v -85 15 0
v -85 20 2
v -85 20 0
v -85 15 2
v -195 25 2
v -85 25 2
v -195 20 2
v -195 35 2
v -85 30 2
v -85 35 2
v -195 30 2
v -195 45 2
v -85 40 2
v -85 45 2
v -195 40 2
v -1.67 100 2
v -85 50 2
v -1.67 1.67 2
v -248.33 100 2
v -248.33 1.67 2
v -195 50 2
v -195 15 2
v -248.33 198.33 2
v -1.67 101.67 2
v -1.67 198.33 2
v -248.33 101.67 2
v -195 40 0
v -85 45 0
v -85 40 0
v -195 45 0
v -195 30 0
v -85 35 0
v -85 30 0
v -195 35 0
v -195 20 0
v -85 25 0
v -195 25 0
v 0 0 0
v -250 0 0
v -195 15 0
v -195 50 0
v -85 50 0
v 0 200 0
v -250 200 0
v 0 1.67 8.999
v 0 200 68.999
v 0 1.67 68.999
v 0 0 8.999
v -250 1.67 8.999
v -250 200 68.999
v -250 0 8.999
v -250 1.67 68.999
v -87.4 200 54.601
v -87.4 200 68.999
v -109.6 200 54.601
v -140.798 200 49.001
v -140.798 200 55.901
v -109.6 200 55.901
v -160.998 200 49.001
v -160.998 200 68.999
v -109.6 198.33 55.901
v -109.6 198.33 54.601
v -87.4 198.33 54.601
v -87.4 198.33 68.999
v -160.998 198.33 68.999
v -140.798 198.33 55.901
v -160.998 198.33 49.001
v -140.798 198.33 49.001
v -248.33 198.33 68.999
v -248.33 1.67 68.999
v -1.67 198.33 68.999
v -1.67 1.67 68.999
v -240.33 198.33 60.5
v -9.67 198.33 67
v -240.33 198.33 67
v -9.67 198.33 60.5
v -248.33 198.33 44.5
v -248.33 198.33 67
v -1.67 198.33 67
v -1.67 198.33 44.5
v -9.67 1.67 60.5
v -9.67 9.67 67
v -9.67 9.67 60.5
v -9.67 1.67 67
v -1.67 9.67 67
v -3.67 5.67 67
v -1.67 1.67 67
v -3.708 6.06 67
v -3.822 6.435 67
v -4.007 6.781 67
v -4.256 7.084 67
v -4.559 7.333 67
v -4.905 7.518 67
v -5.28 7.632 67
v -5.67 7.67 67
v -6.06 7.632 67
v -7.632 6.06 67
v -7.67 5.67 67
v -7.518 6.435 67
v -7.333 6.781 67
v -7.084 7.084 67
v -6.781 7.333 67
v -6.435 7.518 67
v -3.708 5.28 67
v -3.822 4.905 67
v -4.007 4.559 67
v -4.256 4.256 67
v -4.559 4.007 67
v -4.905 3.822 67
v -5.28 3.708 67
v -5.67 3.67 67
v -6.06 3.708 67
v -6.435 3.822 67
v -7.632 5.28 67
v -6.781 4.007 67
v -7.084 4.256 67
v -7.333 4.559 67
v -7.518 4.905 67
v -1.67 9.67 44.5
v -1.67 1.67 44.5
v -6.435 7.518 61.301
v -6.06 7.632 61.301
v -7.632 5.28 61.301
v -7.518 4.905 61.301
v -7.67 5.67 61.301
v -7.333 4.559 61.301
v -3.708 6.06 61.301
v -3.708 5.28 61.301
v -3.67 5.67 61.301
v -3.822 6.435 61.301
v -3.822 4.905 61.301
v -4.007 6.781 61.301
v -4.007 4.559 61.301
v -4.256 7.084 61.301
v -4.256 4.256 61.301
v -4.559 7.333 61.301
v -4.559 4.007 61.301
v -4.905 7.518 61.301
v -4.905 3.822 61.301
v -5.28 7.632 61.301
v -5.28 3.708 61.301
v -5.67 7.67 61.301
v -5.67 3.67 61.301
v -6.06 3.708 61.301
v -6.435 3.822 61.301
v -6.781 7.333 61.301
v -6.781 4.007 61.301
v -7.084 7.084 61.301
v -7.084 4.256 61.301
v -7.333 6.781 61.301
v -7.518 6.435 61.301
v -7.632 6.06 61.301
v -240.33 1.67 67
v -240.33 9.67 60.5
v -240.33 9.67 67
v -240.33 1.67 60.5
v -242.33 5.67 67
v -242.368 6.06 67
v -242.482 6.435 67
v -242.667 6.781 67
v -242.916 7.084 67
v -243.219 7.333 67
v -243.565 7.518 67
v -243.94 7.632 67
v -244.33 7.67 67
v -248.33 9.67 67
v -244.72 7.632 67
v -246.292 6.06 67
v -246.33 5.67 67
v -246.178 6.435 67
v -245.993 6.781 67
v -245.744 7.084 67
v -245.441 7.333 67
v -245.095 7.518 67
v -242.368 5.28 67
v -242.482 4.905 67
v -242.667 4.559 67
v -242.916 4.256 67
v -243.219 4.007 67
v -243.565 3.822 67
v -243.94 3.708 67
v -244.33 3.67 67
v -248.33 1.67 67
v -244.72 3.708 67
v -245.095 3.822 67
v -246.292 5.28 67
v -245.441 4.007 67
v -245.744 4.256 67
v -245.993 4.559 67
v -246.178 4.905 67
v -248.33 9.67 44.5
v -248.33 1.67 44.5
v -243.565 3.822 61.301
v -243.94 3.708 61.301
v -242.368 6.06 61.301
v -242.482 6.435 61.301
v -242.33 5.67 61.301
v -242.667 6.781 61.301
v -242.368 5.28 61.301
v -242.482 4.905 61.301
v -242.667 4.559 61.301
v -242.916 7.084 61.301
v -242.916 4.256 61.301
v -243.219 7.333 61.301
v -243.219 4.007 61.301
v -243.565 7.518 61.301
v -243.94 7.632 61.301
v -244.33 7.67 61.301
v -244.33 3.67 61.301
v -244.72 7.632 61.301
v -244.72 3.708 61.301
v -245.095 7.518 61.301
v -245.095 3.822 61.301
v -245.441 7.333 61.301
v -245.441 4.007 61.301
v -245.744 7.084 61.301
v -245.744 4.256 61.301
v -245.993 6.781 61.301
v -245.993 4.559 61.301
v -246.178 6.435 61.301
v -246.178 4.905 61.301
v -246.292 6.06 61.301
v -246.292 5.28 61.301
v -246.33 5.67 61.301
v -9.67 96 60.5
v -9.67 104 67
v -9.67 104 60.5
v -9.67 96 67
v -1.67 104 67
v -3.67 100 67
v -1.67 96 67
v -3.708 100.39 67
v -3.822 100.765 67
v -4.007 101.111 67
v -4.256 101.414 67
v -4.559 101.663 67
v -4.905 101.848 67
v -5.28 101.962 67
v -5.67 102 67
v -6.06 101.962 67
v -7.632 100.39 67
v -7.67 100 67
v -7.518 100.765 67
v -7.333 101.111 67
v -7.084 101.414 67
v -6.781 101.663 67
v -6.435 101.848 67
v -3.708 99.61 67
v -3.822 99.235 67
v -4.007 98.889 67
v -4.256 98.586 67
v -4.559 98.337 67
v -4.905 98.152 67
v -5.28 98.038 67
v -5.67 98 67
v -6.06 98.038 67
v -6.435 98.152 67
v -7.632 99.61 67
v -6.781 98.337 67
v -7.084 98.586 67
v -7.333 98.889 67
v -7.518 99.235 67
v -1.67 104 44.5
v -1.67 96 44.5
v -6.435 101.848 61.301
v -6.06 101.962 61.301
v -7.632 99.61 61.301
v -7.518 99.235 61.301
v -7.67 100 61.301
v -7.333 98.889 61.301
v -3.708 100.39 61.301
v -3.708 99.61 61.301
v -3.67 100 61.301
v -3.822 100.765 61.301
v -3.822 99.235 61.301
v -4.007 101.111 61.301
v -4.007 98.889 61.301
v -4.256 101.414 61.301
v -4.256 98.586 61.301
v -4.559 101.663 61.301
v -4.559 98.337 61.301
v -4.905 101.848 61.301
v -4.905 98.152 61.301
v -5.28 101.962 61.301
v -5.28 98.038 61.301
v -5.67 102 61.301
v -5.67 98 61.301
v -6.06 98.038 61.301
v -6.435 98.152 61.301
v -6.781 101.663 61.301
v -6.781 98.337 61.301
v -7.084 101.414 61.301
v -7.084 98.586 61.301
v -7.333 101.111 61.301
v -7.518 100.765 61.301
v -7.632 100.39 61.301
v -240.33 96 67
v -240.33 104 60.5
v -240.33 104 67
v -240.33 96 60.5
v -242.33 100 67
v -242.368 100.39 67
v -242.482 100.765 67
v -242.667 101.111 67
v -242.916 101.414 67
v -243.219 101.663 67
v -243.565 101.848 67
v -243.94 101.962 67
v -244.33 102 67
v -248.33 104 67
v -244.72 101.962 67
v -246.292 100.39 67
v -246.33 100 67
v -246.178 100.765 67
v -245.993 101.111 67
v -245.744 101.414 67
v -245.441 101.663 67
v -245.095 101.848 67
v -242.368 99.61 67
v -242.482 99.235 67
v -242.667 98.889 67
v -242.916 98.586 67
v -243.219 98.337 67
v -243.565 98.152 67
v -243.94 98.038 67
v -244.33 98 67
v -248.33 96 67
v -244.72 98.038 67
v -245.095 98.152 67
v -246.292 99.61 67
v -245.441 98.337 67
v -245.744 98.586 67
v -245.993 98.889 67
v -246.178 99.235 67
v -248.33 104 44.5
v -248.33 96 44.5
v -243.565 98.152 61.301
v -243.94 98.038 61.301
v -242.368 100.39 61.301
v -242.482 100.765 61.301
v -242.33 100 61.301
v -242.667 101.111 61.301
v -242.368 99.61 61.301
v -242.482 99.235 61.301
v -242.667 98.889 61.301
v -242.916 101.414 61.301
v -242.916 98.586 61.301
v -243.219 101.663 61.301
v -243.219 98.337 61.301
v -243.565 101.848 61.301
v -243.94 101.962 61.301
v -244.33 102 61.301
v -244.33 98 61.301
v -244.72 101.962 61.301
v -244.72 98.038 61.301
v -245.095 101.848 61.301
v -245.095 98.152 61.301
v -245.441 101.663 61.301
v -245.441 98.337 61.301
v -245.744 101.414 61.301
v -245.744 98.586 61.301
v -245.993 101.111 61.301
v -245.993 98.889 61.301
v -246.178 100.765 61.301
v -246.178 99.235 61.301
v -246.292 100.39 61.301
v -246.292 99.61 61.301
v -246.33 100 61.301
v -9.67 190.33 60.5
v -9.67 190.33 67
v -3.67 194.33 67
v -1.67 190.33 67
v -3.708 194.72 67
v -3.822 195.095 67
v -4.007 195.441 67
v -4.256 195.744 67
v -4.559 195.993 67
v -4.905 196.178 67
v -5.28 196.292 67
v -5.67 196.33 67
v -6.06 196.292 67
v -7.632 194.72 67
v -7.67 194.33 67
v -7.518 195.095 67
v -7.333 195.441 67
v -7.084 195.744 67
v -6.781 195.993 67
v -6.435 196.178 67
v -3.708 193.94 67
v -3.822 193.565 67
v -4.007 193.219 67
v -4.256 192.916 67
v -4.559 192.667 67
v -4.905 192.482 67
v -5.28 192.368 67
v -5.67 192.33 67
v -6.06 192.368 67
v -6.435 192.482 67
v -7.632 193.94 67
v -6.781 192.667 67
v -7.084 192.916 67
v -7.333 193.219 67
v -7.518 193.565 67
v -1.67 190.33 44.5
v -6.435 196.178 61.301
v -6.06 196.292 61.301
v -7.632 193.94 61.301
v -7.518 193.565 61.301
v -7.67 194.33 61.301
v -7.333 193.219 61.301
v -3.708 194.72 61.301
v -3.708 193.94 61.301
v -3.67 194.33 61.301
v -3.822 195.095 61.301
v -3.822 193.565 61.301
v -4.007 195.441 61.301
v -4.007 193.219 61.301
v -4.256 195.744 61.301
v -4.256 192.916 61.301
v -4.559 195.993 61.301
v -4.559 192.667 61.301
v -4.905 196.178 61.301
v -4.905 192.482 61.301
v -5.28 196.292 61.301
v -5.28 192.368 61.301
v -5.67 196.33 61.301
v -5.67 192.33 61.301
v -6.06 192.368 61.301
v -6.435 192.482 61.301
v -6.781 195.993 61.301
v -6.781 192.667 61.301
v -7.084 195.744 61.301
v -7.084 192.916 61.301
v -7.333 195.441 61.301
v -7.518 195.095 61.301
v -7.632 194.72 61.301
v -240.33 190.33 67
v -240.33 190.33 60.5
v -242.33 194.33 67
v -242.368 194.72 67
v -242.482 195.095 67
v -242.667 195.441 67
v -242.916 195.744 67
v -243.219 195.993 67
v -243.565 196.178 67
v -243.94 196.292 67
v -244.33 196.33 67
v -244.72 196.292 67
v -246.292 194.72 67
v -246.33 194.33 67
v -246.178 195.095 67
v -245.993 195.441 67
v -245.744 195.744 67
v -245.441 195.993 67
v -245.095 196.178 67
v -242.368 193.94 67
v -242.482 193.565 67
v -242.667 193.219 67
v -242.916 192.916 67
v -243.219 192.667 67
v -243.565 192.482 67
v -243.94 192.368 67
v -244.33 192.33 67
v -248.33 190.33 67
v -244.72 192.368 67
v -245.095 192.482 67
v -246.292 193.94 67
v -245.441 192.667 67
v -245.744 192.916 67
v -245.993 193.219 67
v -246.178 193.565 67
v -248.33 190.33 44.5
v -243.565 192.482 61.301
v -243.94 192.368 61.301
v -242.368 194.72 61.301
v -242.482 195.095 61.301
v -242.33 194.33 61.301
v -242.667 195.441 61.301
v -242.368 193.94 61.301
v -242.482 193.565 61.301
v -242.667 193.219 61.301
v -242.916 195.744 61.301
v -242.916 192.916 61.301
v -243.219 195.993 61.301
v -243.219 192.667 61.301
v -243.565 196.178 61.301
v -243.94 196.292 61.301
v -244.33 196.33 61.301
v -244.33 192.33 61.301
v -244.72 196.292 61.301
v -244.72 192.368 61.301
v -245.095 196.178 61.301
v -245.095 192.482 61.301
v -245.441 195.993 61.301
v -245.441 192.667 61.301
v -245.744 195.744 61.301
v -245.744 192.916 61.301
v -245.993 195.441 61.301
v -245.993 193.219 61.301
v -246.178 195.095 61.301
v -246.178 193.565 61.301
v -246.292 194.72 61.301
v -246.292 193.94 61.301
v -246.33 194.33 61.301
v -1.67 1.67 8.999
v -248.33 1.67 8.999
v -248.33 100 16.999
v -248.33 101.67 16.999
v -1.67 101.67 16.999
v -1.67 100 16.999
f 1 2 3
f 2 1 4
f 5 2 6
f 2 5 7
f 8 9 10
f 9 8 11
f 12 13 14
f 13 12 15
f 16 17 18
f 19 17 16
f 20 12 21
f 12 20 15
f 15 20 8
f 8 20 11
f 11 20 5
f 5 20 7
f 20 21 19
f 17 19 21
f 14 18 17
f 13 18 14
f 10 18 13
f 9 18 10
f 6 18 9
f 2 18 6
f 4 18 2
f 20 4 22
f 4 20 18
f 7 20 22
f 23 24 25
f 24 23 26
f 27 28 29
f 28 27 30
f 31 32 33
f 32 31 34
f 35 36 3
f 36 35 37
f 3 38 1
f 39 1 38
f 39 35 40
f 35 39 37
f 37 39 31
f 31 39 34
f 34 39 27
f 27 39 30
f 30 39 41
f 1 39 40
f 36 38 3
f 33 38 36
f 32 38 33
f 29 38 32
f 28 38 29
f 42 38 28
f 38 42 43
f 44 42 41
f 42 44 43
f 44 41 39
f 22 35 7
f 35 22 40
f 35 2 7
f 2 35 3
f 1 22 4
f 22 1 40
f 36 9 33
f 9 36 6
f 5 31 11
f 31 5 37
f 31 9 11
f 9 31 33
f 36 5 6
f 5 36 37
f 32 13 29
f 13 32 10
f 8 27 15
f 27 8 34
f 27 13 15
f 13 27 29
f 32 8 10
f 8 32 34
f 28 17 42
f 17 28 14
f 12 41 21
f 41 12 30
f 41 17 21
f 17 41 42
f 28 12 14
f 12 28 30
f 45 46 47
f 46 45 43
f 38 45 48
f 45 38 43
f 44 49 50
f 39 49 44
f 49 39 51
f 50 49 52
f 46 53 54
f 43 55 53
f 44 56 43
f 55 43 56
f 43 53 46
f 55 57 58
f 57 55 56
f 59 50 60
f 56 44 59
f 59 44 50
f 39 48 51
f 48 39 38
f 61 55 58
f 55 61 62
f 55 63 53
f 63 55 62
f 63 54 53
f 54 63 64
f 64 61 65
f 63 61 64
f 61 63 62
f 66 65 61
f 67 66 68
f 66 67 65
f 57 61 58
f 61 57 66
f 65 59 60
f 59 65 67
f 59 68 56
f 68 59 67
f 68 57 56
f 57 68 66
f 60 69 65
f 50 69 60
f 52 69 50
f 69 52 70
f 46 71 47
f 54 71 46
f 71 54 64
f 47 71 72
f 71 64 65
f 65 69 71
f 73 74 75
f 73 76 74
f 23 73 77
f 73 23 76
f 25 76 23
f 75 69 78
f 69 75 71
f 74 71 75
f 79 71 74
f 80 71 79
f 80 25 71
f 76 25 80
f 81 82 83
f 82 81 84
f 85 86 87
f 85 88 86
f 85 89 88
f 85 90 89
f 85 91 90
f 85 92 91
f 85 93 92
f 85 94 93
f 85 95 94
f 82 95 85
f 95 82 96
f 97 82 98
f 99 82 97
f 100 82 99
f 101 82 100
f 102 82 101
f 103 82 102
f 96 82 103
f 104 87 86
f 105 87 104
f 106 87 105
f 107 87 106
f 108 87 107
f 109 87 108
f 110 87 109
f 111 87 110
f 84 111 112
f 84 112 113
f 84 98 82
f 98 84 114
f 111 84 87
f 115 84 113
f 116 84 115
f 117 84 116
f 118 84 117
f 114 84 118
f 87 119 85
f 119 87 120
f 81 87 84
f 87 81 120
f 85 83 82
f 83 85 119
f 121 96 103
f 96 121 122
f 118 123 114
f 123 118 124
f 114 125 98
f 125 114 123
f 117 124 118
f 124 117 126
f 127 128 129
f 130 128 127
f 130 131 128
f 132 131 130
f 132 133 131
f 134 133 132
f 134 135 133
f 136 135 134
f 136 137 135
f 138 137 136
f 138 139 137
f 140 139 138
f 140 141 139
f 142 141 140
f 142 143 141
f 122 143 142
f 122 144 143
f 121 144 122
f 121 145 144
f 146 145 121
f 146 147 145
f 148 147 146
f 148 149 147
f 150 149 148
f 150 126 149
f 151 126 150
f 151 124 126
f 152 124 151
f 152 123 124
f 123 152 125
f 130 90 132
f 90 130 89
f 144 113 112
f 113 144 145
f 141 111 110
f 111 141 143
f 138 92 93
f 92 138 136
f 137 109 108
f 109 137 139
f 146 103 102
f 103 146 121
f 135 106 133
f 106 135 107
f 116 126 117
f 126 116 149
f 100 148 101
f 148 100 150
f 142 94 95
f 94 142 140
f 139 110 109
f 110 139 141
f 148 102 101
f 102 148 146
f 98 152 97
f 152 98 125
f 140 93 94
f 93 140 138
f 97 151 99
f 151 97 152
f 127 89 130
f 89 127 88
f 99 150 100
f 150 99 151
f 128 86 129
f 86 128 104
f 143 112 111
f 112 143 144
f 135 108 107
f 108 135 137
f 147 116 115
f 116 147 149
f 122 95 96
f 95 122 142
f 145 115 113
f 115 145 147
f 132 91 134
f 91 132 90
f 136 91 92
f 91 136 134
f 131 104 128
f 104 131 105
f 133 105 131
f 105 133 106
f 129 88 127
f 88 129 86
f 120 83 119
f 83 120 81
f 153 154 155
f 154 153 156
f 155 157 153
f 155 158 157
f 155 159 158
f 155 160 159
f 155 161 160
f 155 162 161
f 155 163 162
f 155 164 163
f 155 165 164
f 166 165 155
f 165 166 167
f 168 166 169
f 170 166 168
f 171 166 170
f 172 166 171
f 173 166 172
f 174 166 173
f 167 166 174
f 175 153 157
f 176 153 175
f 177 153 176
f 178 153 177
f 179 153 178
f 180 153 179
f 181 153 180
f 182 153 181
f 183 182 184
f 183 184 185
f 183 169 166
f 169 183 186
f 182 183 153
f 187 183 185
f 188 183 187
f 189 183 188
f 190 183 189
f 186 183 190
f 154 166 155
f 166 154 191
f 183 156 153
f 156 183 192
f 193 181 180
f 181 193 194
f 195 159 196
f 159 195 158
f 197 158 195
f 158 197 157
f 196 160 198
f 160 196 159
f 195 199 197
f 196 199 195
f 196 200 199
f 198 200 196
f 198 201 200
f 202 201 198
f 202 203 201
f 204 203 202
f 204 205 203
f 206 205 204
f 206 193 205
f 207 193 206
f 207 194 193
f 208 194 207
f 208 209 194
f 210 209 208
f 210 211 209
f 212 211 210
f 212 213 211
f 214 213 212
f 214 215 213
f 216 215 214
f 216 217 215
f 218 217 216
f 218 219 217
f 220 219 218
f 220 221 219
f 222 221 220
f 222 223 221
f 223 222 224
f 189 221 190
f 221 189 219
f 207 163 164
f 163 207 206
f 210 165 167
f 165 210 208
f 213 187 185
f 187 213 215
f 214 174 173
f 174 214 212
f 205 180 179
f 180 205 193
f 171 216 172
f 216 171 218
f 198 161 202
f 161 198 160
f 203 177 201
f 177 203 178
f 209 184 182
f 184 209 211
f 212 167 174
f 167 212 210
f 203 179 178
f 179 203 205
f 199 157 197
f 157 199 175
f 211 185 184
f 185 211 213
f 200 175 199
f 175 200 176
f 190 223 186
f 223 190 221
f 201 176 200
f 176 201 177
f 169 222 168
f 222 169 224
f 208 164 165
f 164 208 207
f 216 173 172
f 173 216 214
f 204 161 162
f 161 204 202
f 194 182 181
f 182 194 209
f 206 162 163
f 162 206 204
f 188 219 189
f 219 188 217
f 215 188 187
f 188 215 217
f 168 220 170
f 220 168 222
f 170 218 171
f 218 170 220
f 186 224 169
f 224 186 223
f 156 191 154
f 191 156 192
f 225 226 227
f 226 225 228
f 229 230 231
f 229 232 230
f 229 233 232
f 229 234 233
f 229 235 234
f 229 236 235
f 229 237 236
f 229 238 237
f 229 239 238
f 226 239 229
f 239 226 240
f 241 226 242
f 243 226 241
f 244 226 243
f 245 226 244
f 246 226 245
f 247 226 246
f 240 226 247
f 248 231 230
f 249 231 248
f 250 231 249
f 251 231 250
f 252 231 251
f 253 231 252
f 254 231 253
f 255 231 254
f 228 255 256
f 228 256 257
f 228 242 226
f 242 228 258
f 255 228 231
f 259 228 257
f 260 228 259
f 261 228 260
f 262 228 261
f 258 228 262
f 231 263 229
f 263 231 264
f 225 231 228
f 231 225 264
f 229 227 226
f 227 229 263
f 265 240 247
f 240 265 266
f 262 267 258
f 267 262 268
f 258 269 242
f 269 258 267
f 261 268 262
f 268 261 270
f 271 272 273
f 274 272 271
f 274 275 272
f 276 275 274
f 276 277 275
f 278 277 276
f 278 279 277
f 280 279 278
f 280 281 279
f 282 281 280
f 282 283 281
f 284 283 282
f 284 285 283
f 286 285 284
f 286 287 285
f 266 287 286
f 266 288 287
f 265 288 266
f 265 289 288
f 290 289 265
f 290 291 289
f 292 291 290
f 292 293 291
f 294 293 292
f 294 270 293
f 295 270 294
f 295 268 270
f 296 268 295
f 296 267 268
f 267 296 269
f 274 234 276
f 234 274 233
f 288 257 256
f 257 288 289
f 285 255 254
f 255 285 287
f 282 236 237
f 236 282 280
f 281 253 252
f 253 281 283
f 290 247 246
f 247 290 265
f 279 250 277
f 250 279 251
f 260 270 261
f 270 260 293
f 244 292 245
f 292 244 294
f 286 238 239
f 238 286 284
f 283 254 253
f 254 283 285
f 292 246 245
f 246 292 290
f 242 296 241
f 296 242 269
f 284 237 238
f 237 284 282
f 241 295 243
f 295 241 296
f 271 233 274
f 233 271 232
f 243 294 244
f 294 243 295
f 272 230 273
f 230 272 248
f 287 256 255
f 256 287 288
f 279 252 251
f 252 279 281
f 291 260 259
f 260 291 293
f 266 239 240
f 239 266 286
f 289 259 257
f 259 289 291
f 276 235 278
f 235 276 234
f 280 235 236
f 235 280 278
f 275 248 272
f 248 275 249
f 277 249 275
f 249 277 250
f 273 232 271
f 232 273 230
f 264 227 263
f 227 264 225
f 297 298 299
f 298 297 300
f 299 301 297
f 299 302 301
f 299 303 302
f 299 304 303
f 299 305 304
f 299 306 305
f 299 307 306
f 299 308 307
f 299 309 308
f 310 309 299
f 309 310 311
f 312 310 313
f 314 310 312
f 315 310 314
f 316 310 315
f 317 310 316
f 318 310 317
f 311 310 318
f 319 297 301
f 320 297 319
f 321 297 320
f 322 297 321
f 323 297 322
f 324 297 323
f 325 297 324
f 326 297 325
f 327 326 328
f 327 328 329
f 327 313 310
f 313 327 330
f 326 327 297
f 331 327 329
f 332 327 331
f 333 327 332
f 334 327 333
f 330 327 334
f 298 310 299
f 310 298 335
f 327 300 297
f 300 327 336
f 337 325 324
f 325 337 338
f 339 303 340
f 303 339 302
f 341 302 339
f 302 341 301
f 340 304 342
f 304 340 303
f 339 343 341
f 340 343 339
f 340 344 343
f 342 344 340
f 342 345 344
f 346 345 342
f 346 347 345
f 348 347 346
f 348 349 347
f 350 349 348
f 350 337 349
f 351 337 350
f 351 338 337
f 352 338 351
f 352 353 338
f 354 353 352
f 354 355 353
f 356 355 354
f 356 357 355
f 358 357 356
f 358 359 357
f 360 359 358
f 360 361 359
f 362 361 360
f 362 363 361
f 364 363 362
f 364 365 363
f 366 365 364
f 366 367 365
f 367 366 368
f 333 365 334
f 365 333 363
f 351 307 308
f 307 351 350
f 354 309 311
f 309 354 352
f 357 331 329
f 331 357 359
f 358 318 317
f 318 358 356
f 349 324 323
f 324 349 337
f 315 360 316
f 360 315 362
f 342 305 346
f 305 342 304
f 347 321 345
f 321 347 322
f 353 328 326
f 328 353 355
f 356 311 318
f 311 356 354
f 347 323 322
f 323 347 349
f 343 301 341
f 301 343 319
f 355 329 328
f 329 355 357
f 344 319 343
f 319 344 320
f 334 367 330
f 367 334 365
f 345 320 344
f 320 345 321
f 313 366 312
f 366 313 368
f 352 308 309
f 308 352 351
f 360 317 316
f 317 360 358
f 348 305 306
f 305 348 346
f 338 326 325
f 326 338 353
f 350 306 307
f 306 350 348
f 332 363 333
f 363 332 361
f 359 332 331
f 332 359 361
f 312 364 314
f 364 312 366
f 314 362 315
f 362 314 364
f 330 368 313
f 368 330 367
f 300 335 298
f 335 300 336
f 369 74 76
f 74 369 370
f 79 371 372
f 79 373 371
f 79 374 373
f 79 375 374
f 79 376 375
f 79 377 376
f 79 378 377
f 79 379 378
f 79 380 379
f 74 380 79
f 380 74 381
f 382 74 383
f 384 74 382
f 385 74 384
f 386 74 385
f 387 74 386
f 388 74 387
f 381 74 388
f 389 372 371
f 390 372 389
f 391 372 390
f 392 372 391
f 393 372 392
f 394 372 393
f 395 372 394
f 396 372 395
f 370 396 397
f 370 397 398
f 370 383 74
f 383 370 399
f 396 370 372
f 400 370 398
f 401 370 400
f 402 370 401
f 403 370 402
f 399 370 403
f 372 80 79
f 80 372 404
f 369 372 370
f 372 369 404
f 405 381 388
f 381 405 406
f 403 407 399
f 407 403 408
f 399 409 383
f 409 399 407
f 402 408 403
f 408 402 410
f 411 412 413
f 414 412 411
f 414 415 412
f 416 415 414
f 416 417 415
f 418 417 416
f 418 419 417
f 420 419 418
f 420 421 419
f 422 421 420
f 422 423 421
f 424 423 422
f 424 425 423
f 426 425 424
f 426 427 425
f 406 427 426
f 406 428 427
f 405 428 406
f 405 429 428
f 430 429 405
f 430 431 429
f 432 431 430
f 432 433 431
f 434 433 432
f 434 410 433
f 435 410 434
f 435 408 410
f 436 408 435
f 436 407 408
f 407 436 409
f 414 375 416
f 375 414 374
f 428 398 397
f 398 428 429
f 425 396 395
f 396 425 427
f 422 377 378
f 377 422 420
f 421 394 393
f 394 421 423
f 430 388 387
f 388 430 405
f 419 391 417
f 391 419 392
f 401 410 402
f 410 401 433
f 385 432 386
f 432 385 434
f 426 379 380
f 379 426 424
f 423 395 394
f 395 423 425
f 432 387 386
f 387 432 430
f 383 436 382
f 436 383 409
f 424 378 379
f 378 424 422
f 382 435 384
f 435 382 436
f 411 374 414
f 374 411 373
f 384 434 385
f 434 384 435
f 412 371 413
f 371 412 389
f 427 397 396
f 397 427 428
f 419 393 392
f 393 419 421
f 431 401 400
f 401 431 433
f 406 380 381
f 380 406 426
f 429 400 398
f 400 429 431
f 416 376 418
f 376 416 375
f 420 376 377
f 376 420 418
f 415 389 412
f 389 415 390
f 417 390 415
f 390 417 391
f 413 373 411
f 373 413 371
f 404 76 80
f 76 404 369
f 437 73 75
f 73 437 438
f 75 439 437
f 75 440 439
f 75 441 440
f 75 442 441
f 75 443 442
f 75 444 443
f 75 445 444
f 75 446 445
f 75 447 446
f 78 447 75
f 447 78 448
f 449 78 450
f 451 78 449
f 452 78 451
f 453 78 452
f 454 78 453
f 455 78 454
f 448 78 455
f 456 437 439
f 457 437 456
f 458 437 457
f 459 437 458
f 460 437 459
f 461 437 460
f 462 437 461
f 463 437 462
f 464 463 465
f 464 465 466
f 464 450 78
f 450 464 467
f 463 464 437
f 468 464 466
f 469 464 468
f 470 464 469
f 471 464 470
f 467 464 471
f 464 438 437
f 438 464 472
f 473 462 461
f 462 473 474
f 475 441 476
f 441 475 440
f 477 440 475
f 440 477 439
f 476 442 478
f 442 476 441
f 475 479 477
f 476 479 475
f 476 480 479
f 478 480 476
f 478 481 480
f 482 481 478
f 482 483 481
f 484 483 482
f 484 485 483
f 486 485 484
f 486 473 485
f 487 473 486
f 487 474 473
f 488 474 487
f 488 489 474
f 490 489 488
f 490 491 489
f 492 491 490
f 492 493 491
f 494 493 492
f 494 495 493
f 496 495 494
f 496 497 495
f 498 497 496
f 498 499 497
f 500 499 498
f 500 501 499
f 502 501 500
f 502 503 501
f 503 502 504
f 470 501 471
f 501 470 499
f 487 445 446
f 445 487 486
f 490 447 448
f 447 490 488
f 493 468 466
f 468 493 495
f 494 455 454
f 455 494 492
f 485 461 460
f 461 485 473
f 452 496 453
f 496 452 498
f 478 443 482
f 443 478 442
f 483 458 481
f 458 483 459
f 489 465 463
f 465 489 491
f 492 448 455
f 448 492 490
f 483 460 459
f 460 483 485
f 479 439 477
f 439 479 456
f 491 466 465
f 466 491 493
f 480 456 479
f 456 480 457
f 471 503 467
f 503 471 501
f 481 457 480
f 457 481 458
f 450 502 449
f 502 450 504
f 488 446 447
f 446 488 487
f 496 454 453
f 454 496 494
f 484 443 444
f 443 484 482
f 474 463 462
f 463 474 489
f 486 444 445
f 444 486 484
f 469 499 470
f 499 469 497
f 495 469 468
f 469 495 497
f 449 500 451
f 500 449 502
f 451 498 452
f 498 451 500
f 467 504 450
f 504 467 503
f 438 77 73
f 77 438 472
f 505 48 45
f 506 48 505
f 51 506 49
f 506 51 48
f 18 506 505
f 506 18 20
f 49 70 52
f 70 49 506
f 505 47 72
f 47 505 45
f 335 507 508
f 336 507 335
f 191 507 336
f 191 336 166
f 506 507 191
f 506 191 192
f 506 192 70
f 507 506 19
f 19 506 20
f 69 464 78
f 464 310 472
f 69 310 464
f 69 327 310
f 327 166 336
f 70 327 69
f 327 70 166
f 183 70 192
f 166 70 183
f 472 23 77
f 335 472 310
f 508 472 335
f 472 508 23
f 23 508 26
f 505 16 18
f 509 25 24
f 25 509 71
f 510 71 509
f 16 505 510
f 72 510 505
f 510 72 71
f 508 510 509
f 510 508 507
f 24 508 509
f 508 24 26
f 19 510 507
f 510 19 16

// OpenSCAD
// file: prism.scad
// -----------------------------------------------------------------------------
// 3D-Model (OpenSCAD) of a prism
//
// Author: Bernhard Bablok
// License: GPL3
//
// Website: https://github.com/bablokb/pi-webradio
//
// -----------------------------------------------------------------------------

use <MCAD/triangles.scad>

module prism(x,y,z,plane="xy") {
  // plane is the plane of the degenerated triangle
  if (plane == "yz")
    translate([x,0,0]) rotate([0,-90,0]) triangle(y,z,x);
  else if (plane == "xz")
    translate([0,y,0]) rotate([90,0,0]) triangle(z,x,y);
  else if (plane == "xy")
    triangle(y,x,z);
}
// file: cyl_00.scad
// -----------------------------------------------------------------------------
// 3D-Module (OpenSCAD) of non-centered cylinder
//
// Author: Bernhard Bablok
// License: GPL3
//
// Website: https://github.com/bablokb/pi-webradio
//
// -----------------------------------------------------------------------------


module cyl_00(h,d,plane="xy") {
  r00 = d/2.0;
  if (plane == "xy")
    translate([r00,r00,0]) cylinder(h=h,r=r00,center=false);
  else if (plane == "yz")
    translate([0,h,0]) rotate([90,0,0]) cyl_00(h,d);
  else if (plane == "xz")
    translate([r00,0,r00]) rotate([-90,0,0]) cylinder(h=h,r=r00,center=false);
}
// file: thread-pocket.scad
// -----------------------------------------------------------------------------
// 3D-Model (OpenSCAD) of thread-pocket
//
// Author: Bernhard Bablok
// License: GPL3
//
// Website: https://github.com/bablokb/pi-webradio
//
// -----------------------------------------------------------------------------

$fa = 1;
$fs = 0.4;

fuzz = 0.001;

use <cyl_00.scad>
use <prism.scad>

module thread_pocket(chamfer=false) {
  p_xy = 8;            // dimensions of outer cube
  p_z = 6.5;
  c_d = 4;            // diameter pocket
  c_z = 5.7;          // height pocket

  if (chamfer) {
    ch_z = 2*p_xy;
    translate([0,0,-p_z]) rotate([180,0,90]) prism(p_xy,p_xy,ch_z,plane="yz");
  }

  translate([0,0,-p_z]) difference() {
    cube([p_xy,p_xy,p_z]);
    translate([(p_xy-c_d)/2,(p_xy-c_d)/2,p_z-c_z+fuzz]) cyl_00(d=c_d,h=c_z+fuzz,plane="xy");
  }
}
thread_pocket(chamfer=true);
// main file
// -----------------------------------------------------------------------------
// 3D-Model (OpenSCAD) of upper-part of the case.
//
// Note: the construction is upside-down with negative coordinates.
//
// Author: Bernhard Bablok
// License: GPL3
//
// Website: https://github.com/bablokb/pi-webradio
//
// -----------------------------------------------------------------------------

use <thread-pocket.scad>

$fa = 1;
$fs = 0.4;

w4 = 1.67;    // wall thickness 4 layers
h_wall = 67;
fuzz = 0.001; // fuzzing to ensure overlap

// --- base plate   ------------------------------------------------------------

translate([-250,0,0]) difference() {
  color("red") cube([250,200,2]);
 
  // ventilation
  v_depth = 5;
  for (dy=[15:10:45]) {
    translate([55,dy,0]) cube([110,5,2]);
  }
}

// --- cutout back-side   ------------------------------------------------------

  x_add = 0.2;

  x_usb = 22.0+x_add;                // should be 21.34
  z_usb = 14.4;   // 4.7+9.6 + 0.1

  x_hdmi = 31.3-x_add/2;
  z_hdmi = 13.1;  // 6.6+6.4 + 0.1

  x_power = 20+x_add;
  z_power = 20;

module cutout(x_usb,z_usb,x_hdmi,z_hdmi,x_power,z_power) {

  rotate([0,-180,0]) union() {
    cube([x_usb,w4+2*fuzz,z_usb]);
    color("blue") translate([x_usb-fuzz,0,0]) cube([x_hdmi+2*fuzz,w4+2*fuzz,z_hdmi]);
    translate([x_usb+x_hdmi-2*fuzz,0,0]) cube([x_power,w4+2*fuzz,z_power]);
  }
}

// --- walls   -----------------------------------------------------------------

translate([-250,0,2-fuzz]) color("orange") cube([250,w4,7]);    // front
translate([-250,w4,2-fuzz]) color("orange") cube([w4,200-w4,h_wall]);   // left
translate([-w4,w4,2-fuzz]) color("orange") cube([w4,200-w4,h_wall]);    // right
color("orange") difference() {                                  // back
  translate([-250,200-w4,2-fuzz]) cube([250,w4,h_wall]);
  translate([-87.4,200-w4,2+h_wall+fuzz]) cutout(x_usb,z_usb,x_hdmi,z_hdmi,x_power,z_power);  // -87.91
}


// --- screw-sockets   ---------------------------------------------------------

color("green")
  for (dy=[w4,96,190.33]) {
    translate([-w4,dy+8,h_wall])
        rotate([0,0,-180]) thread_pocket(chamfer=true);
    translate([-250+w4,dy,h_wall])
        rotate([0,0,0]) thread_pocket(chamfer=true);
  }

// --- support   ---------------------------------------------------------------

translate([-250,100,2-fuzz]) color("green") cube([250,w4,15]);
